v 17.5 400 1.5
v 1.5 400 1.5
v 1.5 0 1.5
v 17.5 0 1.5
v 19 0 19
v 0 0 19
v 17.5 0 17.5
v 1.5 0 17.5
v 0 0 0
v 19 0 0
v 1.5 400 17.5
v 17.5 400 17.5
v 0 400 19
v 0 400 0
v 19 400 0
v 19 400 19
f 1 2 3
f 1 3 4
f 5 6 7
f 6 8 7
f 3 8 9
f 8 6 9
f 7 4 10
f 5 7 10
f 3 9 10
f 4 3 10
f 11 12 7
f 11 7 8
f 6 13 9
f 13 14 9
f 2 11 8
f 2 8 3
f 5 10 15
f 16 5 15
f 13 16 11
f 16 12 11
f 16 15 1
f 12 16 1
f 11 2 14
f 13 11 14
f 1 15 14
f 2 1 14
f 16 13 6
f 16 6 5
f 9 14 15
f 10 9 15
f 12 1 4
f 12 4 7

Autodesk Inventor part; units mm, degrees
ref_plane "YZ Plane" through (0, 0, 0) normal (1, 0, 0) x (0, 1, 0)
ref_plane "XZ Plane" through (0, 0, 0) normal (0, 1, 0) x (-1, 0, 0)
ref_plane "XY Plane" through (0, 0, 0) normal (0, 0, 1) x (1, 0, 0)
sketch "Sketch1" plane through (0, 0, 0) normal (0, 0, 1) x (1, 0, 0)
  line L0 (0, 0) -> (19, 0)
  line L1 (19, 0) -> (19, 400)
  line L2 (19, 400) -> (0, 400)
  line L3 (0, 400) -> (0, 0)
  dimension "d0" = 19
  dimension "d1" = 400
extrude "Extrusion1" add sketch "Sketch1" along normal blind 19
sketch "Sketch2" plane through (0, 400, 0) normal (0, 1, 0) x (1, 0, 0)
  line L0 (19, 0) -> (0, 0) projected
  line L1 (0, 0) -> (0, -19) projected
  line L2 (19, -19) -> (0, -19) projected
  line L3 (19, 0) -> (19, -19) projected
  line L4 (1.5, -17.5) -> (1.5, -1.5)
  line L5 (1.5, -1.5) -> (17.5, -1.5)
  line L6 (17.5, -1.5) -> (17.5, -17.5)
  line L7 (17.5, -17.5) -> (1.5, -17.5)
  point P0 (0, 0)
  dimension "d4" = 1.5
extrude "Extrusion2" cut sketch "Sketch2" against normal through all contours L4 L5 L6 L7
properties part number "C001" material "Aluminum 6061"
